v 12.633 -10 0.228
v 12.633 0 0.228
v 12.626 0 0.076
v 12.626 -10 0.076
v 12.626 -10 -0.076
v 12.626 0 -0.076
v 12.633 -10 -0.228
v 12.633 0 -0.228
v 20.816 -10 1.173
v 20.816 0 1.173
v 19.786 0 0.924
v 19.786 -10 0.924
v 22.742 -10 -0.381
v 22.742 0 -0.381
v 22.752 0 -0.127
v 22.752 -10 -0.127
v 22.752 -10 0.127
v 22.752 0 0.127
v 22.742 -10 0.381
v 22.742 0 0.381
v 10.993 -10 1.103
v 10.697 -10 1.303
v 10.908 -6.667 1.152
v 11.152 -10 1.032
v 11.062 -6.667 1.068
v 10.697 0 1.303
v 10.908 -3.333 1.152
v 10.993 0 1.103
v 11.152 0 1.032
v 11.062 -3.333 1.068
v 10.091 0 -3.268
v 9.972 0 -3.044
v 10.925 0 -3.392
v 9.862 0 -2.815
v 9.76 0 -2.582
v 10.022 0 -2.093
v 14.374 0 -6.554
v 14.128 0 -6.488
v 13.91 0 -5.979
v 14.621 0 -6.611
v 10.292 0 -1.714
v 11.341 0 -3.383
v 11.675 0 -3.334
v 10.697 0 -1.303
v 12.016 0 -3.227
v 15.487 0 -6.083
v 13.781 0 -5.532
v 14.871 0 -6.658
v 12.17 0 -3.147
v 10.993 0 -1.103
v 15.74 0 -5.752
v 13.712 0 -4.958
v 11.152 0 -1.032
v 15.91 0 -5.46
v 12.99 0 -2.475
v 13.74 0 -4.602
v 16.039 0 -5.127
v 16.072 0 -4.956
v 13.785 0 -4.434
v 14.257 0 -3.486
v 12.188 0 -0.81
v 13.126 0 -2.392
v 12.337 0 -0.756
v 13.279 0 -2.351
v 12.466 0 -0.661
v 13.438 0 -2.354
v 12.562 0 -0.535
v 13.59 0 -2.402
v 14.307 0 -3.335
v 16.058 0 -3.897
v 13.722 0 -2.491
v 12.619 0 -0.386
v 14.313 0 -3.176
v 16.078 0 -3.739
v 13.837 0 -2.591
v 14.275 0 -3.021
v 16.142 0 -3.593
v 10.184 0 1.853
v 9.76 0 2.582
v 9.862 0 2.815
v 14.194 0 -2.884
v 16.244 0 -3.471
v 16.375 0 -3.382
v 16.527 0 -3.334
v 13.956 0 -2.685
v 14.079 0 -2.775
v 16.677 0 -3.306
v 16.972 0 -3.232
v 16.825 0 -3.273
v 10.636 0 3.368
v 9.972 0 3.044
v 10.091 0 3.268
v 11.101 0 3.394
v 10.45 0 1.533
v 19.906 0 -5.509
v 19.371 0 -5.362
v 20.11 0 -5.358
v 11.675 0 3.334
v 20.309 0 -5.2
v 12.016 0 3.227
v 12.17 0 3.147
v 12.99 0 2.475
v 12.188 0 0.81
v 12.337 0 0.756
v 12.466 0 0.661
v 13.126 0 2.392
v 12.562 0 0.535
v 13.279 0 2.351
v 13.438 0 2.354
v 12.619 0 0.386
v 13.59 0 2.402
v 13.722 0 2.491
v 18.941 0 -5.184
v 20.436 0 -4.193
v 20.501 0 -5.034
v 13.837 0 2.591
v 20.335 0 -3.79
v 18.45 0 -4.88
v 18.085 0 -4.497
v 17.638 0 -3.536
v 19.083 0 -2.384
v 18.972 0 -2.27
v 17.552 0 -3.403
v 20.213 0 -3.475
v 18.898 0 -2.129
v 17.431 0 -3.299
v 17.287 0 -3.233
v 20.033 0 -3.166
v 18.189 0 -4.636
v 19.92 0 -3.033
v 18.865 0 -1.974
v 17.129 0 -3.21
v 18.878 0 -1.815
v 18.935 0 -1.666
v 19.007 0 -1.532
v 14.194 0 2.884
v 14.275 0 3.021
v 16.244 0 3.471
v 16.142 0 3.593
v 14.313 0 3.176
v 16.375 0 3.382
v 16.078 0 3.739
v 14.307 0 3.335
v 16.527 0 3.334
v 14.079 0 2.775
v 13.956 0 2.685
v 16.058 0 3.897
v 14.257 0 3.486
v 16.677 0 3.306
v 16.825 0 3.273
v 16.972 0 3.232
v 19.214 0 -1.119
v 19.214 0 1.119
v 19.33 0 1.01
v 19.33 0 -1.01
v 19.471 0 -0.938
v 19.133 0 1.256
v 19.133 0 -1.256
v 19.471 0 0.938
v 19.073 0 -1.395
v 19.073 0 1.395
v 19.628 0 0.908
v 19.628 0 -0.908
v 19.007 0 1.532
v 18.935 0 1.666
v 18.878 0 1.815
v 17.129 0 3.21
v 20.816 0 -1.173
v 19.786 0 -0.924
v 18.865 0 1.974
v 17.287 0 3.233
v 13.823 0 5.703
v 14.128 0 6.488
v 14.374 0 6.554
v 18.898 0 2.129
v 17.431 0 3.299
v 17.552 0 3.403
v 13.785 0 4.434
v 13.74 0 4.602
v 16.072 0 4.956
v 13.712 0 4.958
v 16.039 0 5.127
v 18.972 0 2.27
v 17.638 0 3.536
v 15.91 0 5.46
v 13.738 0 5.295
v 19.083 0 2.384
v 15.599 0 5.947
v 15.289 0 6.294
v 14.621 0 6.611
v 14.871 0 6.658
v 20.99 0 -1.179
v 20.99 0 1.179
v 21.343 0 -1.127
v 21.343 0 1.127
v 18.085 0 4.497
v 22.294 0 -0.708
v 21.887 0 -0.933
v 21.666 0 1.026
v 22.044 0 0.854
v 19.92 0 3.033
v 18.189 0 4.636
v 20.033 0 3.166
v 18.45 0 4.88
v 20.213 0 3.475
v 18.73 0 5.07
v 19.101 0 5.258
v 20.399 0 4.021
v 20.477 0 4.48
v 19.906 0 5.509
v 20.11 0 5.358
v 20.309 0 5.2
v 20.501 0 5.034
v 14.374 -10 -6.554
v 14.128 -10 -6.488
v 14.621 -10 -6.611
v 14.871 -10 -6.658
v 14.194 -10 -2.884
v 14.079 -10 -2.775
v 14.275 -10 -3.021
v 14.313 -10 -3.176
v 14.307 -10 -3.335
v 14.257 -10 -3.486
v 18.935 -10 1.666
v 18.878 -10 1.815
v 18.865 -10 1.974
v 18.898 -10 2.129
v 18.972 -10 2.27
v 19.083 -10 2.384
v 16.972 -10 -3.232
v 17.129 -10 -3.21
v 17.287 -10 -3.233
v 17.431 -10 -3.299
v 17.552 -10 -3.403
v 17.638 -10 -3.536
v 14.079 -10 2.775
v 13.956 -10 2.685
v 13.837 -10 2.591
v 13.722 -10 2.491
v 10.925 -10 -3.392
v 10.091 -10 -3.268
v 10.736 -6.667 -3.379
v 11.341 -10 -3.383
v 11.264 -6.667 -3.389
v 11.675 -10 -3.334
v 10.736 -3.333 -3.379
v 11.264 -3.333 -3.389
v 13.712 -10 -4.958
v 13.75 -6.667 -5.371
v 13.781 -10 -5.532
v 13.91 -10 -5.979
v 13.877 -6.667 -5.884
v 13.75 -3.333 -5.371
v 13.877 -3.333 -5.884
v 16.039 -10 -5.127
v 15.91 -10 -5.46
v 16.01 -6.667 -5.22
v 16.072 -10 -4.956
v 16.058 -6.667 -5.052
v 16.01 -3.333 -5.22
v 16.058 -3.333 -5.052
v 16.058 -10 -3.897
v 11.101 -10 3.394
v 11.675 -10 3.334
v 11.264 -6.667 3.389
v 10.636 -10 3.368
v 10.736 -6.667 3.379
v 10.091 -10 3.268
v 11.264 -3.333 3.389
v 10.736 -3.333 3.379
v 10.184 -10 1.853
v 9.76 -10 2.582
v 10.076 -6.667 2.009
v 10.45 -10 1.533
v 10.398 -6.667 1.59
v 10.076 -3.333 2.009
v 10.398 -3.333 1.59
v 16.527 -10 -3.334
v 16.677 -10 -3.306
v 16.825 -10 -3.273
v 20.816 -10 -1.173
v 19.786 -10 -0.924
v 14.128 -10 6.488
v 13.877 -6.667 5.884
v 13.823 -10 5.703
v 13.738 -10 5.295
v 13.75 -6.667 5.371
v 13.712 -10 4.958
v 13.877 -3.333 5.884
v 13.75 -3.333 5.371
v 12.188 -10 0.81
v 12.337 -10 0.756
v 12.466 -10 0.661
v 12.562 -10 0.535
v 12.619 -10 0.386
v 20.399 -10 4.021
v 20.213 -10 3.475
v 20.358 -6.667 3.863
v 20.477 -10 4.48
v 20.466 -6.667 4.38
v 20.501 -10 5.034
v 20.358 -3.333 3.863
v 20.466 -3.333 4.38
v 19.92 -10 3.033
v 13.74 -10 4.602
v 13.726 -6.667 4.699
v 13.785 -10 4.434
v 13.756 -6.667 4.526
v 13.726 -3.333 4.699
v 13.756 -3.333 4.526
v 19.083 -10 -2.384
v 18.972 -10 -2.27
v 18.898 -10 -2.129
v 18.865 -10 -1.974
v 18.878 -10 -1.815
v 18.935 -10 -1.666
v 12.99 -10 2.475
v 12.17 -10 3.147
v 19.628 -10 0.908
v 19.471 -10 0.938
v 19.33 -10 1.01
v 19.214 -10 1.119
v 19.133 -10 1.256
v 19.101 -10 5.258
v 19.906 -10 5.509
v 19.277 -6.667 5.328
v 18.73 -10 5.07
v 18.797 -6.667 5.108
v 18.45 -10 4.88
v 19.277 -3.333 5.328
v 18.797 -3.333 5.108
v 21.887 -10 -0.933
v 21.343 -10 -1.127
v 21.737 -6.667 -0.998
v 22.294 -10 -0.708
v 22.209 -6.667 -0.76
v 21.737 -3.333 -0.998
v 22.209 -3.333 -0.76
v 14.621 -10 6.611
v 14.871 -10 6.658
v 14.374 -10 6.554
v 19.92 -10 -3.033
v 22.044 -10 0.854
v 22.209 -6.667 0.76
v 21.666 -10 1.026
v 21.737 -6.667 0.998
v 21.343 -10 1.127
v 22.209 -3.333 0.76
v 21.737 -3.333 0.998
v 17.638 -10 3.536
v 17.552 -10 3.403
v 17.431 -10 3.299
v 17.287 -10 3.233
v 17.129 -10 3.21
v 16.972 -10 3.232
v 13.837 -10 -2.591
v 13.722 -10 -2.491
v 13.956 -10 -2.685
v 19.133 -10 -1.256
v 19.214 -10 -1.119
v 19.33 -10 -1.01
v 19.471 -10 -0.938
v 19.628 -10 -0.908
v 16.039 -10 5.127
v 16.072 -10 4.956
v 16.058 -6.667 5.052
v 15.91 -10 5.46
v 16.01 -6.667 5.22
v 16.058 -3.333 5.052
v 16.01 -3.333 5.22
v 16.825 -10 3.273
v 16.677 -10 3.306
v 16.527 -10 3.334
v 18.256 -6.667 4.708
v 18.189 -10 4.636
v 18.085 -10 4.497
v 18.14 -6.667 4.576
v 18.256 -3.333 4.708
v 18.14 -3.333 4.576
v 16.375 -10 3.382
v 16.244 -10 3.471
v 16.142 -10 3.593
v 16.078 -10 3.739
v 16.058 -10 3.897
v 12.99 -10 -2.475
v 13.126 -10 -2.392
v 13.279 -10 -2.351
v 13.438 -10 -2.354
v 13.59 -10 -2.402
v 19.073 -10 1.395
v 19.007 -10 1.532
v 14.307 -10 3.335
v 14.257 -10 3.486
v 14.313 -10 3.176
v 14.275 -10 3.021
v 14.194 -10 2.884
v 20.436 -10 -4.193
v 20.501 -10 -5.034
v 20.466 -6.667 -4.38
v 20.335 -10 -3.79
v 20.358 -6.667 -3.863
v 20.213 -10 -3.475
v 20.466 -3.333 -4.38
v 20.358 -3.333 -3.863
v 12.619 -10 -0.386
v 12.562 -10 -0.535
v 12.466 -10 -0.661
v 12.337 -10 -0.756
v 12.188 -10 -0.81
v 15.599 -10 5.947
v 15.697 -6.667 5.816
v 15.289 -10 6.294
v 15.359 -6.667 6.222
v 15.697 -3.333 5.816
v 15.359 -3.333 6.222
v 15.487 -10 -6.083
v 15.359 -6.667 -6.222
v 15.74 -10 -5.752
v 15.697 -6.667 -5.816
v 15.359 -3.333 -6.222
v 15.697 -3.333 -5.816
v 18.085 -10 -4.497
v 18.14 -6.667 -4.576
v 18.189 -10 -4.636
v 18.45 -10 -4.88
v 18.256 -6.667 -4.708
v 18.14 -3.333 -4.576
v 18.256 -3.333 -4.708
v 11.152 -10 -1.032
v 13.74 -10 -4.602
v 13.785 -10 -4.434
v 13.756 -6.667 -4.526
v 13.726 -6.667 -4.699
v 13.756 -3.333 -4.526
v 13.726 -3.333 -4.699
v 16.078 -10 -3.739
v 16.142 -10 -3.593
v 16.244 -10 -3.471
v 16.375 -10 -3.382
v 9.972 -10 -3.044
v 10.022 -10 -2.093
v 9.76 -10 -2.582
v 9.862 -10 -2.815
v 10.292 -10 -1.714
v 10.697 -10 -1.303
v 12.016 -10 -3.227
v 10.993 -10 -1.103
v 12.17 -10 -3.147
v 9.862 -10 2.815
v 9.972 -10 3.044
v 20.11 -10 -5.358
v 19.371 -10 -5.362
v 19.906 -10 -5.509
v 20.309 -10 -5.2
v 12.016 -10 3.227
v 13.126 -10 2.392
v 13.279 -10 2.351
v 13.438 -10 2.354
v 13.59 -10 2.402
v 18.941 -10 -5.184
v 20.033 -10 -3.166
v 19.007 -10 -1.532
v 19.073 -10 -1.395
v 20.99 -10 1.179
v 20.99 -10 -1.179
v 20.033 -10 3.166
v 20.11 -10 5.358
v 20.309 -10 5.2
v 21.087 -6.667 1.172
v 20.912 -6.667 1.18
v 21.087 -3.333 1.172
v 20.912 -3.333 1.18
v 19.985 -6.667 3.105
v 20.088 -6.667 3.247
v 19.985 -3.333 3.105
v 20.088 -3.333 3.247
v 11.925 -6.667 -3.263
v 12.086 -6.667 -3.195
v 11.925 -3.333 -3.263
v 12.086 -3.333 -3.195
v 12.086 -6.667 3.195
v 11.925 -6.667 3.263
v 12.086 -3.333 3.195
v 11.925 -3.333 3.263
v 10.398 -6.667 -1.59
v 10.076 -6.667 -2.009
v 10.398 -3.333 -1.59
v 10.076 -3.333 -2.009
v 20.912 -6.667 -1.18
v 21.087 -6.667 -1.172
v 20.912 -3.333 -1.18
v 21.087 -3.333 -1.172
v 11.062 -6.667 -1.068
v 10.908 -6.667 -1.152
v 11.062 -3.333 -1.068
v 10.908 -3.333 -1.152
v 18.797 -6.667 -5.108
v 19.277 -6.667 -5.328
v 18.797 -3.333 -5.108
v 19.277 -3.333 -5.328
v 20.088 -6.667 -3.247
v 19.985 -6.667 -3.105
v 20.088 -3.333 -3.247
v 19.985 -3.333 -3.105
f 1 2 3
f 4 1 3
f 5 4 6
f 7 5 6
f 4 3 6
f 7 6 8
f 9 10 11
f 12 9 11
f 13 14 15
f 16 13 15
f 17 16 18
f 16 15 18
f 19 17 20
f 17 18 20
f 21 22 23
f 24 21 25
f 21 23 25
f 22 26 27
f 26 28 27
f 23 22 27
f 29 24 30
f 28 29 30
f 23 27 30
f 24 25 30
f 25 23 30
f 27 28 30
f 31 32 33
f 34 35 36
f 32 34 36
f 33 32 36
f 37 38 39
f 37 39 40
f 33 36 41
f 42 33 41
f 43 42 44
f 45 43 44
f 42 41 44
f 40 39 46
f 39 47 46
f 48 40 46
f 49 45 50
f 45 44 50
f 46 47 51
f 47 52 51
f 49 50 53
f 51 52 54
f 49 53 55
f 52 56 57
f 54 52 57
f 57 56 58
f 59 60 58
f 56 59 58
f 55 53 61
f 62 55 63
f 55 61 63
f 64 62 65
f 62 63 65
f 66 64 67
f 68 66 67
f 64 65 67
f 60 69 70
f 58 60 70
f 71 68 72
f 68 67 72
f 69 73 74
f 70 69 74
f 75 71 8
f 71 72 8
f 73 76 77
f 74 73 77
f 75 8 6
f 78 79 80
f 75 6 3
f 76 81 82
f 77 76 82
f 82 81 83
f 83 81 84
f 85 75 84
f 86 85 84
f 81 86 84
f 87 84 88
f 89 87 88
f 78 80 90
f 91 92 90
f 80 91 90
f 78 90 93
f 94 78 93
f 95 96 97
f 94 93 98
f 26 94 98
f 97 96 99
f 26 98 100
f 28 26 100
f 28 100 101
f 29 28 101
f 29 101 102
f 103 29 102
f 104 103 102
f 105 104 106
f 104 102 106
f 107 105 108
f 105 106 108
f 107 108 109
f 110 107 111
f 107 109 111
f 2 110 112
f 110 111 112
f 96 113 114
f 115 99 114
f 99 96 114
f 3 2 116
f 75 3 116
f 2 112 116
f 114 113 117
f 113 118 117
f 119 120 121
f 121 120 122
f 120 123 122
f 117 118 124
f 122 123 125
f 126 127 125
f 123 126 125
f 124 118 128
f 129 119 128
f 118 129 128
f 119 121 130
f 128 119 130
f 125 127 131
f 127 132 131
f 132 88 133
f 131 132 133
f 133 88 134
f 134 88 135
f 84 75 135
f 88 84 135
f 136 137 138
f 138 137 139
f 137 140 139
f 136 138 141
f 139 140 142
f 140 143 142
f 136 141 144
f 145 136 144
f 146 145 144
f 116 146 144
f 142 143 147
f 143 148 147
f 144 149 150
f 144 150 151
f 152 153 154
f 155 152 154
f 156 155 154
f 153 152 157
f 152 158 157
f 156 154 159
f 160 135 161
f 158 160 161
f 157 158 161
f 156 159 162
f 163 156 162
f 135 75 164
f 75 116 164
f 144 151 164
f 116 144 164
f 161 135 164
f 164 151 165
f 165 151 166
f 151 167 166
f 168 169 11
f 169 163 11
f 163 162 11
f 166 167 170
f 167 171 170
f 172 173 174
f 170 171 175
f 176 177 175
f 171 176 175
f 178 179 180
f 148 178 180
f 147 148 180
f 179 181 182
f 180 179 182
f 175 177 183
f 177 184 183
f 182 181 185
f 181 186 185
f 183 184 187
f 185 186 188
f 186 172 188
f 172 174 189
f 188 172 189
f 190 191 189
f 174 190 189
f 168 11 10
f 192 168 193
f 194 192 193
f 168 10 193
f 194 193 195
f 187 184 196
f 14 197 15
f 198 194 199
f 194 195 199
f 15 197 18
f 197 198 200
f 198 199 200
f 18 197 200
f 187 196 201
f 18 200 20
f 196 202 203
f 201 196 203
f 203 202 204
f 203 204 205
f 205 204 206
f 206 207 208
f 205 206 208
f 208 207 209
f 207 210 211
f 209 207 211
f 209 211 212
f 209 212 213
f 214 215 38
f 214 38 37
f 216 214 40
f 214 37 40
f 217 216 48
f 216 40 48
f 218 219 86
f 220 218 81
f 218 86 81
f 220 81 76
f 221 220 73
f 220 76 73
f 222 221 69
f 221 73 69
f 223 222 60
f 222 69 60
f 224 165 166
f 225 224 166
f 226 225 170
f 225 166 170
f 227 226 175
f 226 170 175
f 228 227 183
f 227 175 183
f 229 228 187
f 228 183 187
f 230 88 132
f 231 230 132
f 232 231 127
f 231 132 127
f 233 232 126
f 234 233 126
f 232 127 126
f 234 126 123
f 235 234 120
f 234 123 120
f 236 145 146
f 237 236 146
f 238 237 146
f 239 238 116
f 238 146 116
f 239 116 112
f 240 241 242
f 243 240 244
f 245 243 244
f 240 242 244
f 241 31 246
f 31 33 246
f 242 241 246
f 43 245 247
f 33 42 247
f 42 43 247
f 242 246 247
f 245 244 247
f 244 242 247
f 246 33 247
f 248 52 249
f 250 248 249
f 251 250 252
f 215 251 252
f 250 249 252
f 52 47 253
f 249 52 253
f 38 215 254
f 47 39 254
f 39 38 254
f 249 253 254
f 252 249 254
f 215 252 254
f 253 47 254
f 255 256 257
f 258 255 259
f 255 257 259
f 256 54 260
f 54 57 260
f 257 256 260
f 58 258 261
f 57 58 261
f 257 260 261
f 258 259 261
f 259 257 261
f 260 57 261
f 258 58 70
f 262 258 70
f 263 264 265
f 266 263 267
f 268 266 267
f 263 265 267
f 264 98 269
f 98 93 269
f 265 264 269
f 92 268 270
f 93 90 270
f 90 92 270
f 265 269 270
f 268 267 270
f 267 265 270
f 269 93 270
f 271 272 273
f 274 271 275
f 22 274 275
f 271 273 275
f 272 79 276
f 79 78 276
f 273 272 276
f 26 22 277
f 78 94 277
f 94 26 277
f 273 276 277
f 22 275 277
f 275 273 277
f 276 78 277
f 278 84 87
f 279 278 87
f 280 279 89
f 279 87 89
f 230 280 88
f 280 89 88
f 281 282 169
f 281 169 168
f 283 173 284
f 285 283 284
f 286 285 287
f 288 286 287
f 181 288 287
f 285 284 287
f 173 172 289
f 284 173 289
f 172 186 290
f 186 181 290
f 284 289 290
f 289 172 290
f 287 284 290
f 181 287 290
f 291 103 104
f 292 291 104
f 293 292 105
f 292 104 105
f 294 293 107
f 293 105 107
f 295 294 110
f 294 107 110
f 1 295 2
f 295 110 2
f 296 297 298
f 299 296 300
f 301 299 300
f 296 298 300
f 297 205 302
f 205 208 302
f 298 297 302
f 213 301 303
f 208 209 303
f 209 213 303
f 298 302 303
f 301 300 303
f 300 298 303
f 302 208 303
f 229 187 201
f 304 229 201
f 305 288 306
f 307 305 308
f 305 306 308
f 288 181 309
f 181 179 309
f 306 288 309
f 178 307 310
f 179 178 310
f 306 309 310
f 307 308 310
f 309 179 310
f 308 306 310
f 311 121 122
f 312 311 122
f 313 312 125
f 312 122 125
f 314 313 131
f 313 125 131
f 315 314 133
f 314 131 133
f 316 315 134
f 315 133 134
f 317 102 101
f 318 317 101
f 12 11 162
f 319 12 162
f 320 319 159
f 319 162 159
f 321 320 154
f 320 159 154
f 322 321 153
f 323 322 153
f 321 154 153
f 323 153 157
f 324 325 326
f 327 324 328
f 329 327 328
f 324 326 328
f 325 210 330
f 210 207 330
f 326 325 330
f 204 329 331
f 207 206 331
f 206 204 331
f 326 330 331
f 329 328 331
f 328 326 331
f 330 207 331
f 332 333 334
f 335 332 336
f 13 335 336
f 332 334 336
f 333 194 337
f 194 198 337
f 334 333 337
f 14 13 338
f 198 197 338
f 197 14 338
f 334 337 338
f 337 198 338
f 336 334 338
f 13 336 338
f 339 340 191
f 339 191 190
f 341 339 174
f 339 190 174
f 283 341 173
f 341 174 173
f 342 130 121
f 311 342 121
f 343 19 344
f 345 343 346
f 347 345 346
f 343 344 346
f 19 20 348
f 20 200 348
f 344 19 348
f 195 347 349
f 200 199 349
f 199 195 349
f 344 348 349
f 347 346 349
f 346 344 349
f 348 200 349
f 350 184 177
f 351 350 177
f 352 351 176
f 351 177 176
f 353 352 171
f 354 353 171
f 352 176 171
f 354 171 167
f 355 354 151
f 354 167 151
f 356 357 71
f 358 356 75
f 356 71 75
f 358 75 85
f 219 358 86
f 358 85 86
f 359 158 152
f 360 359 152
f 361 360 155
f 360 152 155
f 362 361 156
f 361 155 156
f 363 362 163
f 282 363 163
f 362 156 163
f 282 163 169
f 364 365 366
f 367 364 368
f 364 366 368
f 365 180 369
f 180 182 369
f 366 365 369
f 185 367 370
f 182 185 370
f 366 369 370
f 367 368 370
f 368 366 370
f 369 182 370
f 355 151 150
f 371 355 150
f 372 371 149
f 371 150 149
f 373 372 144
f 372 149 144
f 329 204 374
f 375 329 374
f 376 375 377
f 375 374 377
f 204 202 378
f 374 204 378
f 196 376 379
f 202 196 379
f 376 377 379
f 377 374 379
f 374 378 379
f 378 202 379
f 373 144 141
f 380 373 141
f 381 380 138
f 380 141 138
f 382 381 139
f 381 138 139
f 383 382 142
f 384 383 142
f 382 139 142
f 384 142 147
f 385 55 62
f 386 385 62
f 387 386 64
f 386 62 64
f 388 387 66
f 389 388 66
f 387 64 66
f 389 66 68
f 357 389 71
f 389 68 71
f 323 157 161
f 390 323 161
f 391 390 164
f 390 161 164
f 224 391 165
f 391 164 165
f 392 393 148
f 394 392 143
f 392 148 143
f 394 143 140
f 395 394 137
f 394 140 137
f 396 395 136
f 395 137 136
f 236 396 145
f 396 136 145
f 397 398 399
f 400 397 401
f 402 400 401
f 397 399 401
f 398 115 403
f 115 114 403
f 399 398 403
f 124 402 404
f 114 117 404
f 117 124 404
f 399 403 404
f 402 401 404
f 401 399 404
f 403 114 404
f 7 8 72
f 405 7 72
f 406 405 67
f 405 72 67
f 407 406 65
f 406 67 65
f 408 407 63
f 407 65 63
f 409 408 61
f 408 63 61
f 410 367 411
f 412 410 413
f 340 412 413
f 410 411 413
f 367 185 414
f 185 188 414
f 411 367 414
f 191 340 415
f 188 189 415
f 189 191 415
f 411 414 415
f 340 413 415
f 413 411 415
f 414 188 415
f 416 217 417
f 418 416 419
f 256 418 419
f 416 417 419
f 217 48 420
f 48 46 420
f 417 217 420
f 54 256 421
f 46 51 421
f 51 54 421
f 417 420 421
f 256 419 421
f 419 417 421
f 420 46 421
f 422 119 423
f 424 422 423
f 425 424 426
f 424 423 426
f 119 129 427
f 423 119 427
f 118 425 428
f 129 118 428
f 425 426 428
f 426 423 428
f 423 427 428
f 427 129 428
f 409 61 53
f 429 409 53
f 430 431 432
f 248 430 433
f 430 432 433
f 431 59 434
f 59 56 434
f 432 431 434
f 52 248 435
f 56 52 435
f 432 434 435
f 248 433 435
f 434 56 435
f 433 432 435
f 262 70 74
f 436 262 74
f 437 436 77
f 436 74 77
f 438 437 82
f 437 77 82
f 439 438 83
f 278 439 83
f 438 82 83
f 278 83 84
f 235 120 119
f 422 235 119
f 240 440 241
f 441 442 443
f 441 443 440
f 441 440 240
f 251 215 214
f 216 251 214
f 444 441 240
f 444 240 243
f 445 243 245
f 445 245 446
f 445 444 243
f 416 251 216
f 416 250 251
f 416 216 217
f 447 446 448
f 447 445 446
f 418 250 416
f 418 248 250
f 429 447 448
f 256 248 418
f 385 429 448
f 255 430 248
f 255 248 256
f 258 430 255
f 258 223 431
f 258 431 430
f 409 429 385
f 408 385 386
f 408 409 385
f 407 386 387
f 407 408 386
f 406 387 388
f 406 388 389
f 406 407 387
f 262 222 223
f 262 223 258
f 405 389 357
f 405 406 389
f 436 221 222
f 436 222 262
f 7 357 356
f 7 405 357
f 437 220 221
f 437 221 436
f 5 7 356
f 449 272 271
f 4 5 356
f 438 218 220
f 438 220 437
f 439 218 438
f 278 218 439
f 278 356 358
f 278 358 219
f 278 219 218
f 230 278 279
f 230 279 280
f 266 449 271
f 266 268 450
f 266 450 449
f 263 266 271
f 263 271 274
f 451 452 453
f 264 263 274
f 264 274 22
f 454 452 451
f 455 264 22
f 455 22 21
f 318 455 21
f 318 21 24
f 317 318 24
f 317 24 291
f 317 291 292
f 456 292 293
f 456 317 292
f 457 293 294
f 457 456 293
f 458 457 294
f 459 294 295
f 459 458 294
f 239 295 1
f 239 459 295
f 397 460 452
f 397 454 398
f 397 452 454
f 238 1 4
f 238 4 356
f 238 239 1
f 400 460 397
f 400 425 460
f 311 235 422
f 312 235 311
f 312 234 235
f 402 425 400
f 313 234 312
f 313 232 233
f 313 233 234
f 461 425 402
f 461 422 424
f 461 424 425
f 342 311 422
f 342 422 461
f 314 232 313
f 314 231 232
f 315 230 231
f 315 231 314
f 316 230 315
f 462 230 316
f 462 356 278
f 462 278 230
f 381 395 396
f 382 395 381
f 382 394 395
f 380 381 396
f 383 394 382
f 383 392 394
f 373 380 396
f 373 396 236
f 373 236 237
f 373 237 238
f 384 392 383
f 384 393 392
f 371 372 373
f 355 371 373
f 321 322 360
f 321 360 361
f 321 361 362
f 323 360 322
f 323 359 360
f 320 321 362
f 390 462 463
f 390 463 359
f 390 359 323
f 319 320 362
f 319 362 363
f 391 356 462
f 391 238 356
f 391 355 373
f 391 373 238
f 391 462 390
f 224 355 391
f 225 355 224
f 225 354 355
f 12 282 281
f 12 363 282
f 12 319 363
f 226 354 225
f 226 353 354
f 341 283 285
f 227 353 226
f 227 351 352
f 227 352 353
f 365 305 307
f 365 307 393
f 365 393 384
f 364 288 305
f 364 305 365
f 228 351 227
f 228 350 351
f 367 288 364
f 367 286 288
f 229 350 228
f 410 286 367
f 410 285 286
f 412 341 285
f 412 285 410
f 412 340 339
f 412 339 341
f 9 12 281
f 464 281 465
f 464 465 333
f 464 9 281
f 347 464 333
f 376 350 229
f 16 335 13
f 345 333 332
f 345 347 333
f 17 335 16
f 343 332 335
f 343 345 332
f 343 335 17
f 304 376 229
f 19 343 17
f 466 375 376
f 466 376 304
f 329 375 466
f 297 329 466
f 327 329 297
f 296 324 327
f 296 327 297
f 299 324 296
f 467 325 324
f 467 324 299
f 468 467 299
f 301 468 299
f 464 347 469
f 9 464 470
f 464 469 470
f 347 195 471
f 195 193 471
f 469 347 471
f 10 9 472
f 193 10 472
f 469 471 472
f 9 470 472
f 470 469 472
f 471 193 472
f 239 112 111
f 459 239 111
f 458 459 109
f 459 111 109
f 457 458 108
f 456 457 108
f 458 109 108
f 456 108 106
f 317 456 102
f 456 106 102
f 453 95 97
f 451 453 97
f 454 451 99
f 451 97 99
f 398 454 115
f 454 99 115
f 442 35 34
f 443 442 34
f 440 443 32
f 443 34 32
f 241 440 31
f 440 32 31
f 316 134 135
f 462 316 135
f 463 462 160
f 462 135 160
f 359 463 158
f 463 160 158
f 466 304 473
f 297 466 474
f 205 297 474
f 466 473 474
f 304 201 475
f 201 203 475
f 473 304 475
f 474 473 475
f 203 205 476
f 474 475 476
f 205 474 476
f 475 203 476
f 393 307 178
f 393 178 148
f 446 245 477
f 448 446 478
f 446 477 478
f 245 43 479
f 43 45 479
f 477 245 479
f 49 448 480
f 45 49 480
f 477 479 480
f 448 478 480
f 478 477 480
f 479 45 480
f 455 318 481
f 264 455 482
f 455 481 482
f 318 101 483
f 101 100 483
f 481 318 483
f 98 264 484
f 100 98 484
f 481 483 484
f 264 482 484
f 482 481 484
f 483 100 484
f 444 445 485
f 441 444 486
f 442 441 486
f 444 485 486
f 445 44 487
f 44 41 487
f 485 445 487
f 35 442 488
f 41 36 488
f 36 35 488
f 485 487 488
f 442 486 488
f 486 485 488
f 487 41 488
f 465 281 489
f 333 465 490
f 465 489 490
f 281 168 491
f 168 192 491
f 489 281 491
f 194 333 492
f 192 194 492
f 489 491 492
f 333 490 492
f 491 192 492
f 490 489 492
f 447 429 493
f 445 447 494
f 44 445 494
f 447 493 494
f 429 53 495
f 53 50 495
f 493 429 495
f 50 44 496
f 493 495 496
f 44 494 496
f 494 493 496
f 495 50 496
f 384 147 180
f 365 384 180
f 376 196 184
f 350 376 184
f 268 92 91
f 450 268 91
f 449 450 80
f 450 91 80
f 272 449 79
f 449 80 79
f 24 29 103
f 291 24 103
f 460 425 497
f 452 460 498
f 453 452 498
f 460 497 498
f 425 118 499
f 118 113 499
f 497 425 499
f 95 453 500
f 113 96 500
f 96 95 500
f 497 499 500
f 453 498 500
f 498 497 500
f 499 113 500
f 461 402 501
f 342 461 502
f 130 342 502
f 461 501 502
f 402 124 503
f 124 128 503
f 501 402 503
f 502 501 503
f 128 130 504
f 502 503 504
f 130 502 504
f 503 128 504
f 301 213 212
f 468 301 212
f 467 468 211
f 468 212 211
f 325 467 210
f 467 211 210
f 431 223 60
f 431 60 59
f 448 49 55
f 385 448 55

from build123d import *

# Parameters (mm, degrees)
PAD003_DEPTH = 10
POCKET_DEPTH = 10.001


with BuildPart() as ruota_dentata_motore:
    # InvoluteGear001 → Pad003 (new body)
    with BuildSketch(Plane(origin=(16, 0, 0), x_dir=(1, 0, 0), z_dir=(0, -1, 0))):
        with BuildLine():
            Line((3.786059, -0.923719), (4.81556, -1.173313))
            add(Edge.make_bspline(
                [(4.81556, -1.173313), (4.873385, -1.181675), (5.046346, -1.195856), (5.34323, -1.127243)],
                knots=[0, 0, 0, 0, 1, 1, 1, 1], degree=3))
            add(Edge.make_bspline(
                [(5.34323, -1.127243), (5.693315, -1.042189), (6.183331, -0.841463), (6.742255, -0.380782)],
                knots=[0, 0, 0, 0, 1, 1, 1, 1], degree=3))
            ThreePointArc((6.742255, -0.380782), (6.753004, 0), (6.742255, 0.380782))
            add(Edge.make_bspline(
                [(6.742255, 0.380782), (6.183331, 0.841463), (5.693315, 1.042189), (5.34323, 1.127243)],
                knots=[0, 0, 0, 0, 1, 1, 1, 1], degree=3))
            add(Edge.make_bspline(
                [(5.34323, 1.127243), (5.046346, 1.195856), (4.873385, 1.181675), (4.81556, 1.173313)],
                knots=[0, 0, 0, 0, 1, 1, 1, 1], degree=3))
            Line((4.81556, 1.173313), (3.786059, 0.923719))
            ThreePointArc((3.786059, 0.923719), (3.397937, 0.968687), (3.132738, 1.25562))
            ThreePointArc((3.132738, 1.25562), (3.04077, 1.464358), (2.934913, 1.666407))
            ThreePointArc((2.934913, 1.666407), (2.875929, 2.052647), (3.082762, 2.384131))
            Line((3.082762, 2.384131), (3.919786, 3.033407))
            add(Edge.make_bspline(
                [(3.919786, 3.033407), (3.962376, 3.073404), (4.081304, 3.199788), (4.212764, 3.474681)],
                knots=[0, 0, 0, 0, 1, 1, 1, 1], degree=3))
            add(Edge.make_bspline(
                [(4.212764, 3.474681), (4.364539, 3.801419), (4.513126, 4.309679), (4.501435, 5.033894)],
                knots=[0, 0, 0, 0, 1, 1, 1, 1], degree=3))
            ThreePointArc((4.501435, 5.033894), (4.210429, 5.279711), (3.90602, 5.508721))
            add(Edge.make_bspline(
                [(3.90602, 5.508721), (3.197362, 5.358966), (2.734908, 5.101007), (2.450135, 4.88033)],
                knots=[0, 0, 0, 0, 1, 1, 1, 1], degree=3))
            add(Edge.make_bspline(
                [(2.450135, 4.88033), (2.211387, 4.690996), (2.114635, 4.546928), (2.085119, 4.496505)],
                knots=[0, 0, 0, 0, 1, 1, 1, 1], degree=3))
            Line((2.085119, 4.496505), (1.638377, 3.53599))
            ThreePointArc((1.638377, 3.53599), (1.361229, 3.260581), (0.971547, 3.232139))
            ThreePointArc((0.971547, 3.232139), (0.751008, 3.290382), (0.527039, 3.333595))
            ThreePointArc((0.527039, 3.333595), (0.188288, 3.528297), (0.058082, 3.896681))
            Line((0.058082, 3.896681), (0.072333, 4.95591))
            add(Edge.make_bspline(
                [(0.072333, 4.95591), (0.067617, 5.014146), (0.042956, 5.185927), (-0.09, 5.460099)],
                knots=[0, 0, 0, 0, 1, 1, 1, 1], degree=3))
            add(Edge.make_bspline(
                [(-0.09, 5.460099), (-0.250823, 5.78248), (-0.555555, 6.215545), (-1.129058, 6.657945)],
                knots=[0, 0, 0, 0, 1, 1, 1, 1], degree=3))
            ThreePointArc((-1.129058, 6.657945), (-1.502685, 6.583692), (-1.871528, 6.488481))
            add(Edge.make_bspline(
                [(-1.871528, 6.488481), (-2.196286, 5.841059), (-2.28294, 5.318663), (-2.287961, 4.958429)],
                knots=[0, 0, 0, 0, 1, 1, 1, 1], degree=3))
            add(Edge.make_bspline(
                [(-2.287961, 4.958429), (-2.288791, 4.65372), (-2.236478, 4.488252), (-2.215459, 4.433737)],
                knots=[0, 0, 0, 0, 1, 1, 1, 1], degree=3))
            Line((-2.215459, 4.433737), (-1.743037, 3.485588))
            ThreePointArc((-1.743037, 3.485588), (-1.700512, 3.09719), (-1.921238, 2.774792))
            ThreePointArc((-1.921238, 2.774792), (-2.104278, 2.638681), (-2.277706, 2.490518))
            ThreePointArc((-2.277706, 2.490518), (-2.641138, 2.347067), (-3.010335, 2.474951))
            Line((-3.010335, 2.474951), (-3.829588, 3.146512))
            add(Edge.make_bspline(
                [(-3.829588, 3.146512), (-3.878059, 3.179135), (-4.027738, 3.266957), (-4.324991, 3.333952)],
                knots=[0, 0, 0, 0, 1, 1, 1, 1], degree=3))
            add(Edge.make_bspline(
                [(-4.324991, 3.333952), (-4.677311, 3.409216), (-5.205892, 3.440979), (-5.909347, 3.268428)],
                knots=[0, 0, 0, 0, 1, 1, 1, 1], degree=3))
            ThreePointArc((-5.909347, 3.268428), (-6.084247, 2.930019), (-6.239777, 2.582282))
            add(Edge.make_bspline(
                [(-6.239777, 2.582282), (-5.936086, 1.924715), (-5.581688, 1.531257), (-5.303176, 1.30273)],
                knots=[0, 0, 0, 0, 1, 1, 1, 1], degree=3))
            add(Edge.make_bspline(
                [(-5.303176, 1.30273), (-5.065463, 1.112098), (-4.903478, 1.04983), (-4.847751, 1.032274)],
                knots=[0, 0, 0, 0, 1, 1, 1, 1], degree=3))
            Line((-4.847751, 1.032274), (-3.811908, 0.810467))
            ThreePointArc((-3.811908, 0.810467), (-3.481733, 0.601552), (-3.367292, 0.22797))
            ThreePointArc((-3.367292, 0.22797), (-3.375, 0), (-3.367292, -0.22797))
            ThreePointArc((-3.367292, -0.22797), (-3.481733, -0.601552), (-3.811908, -0.810467))
            Line((-3.811908, -0.810467), (-4.847751, -1.032274))
            add(Edge.make_bspline(
                [(-4.847751, -1.032274), (-4.903478, -1.04983), (-5.065463, -1.112098), (-5.303176, -1.30273)],
                knots=[0, 0, 0, 0, 1, 1, 1, 1], degree=3))
            add(Edge.make_bspline(
                [(-5.303176, -1.30273), (-5.581688, -1.531257), (-5.936086, -1.924715), (-6.239777, -2.582282)],
                knots=[0, 0, 0, 0, 1, 1, 1, 1], degree=3))
            ThreePointArc((-6.239777, -2.582282), (-6.084247, -2.930019), (-5.909347, -3.268428))
            add(Edge.make_bspline(
                [(-5.909347, -3.268428), (-5.205892, -3.440979), (-4.677311, -3.409216), (-4.324991, -3.333952)],
                knots=[0, 0, 0, 0, 1, 1, 1, 1], degree=3))
            add(Edge.make_bspline(
                [(-4.324991, -3.333952), (-4.027738, -3.266957), (-3.878059, -3.179135), (-3.829588, -3.146512)],
                knots=[0, 0, 0, 0, 1, 1, 1, 1], degree=3))
            Line((-3.829588, -3.146512), (-3.010335, -2.474951))
            ThreePointArc((-3.010335, -2.474951), (-2.641138, -2.347067), (-2.277706, -2.490518))
            ThreePointArc((-2.277706, -2.490518), (-2.104278, -2.638681), (-1.921238, -2.774792))
            ThreePointArc((-1.921238, -2.774792), (-1.700512, -3.09719), (-1.743037, -3.485588))
            Line((-1.743037, -3.485588), (-2.215459, -4.433737))
            add(Edge.make_bspline(
                [(-2.215459, -4.433737), (-2.236478, -4.488252), (-2.288791, -4.65372), (-2.287961, -4.958429)],
                knots=[0, 0, 0, 0, 1, 1, 1, 1], degree=3))
            add(Edge.make_bspline(
                [(-2.287961, -4.958429), (-2.28294, -5.318663), (-2.196286, -5.841059), (-1.871528, -6.488481)],
                knots=[0, 0, 0, 0, 1, 1, 1, 1], degree=3))
            ThreePointArc((-1.871528, -6.488481), (-1.502685, -6.583692), (-1.129058, -6.657945))
            add(Edge.make_bspline(
                [(-1.129058, -6.657945), (-0.555555, -6.215545), (-0.250823, -5.78248), (-0.09, -5.460099)],
                knots=[0, 0, 0, 0, 1, 1, 1, 1], degree=3))
            add(Edge.make_bspline(
                [(-0.09, -5.460099), (0.042956, -5.185927), (0.067617, -5.014146), (0.072333, -4.95591)],
                knots=[0, 0, 0, 0, 1, 1, 1, 1], degree=3))
            Line((0.072333, -4.95591), (0.058082, -3.896681))
            ThreePointArc((0.058082, -3.896681), (0.188288, -3.528297), (0.527039, -3.333595))
            ThreePointArc((0.527039, -3.333595), (0.751008, -3.290382), (0.971547, -3.232139))
            ThreePointArc((0.971547, -3.232139), (1.361229, -3.260581), (1.638377, -3.53599))
            Line((1.638377, -3.53599), (2.085119, -4.496505))
            add(Edge.make_bspline(
                [(2.085119, -4.496505), (2.114635, -4.546928), (2.211387, -4.690996), (2.450135, -4.88033)],
                knots=[0, 0, 0, 0, 1, 1, 1, 1], degree=3))
            add(Edge.make_bspline(
                [(2.450135, -4.88033), (2.734908, -5.101007), (3.197362, -5.358966), (3.90602, -5.508721)],
                knots=[0, 0, 0, 0, 1, 1, 1, 1], degree=3))
            ThreePointArc((3.90602, -5.508721), (4.210429, -5.279711), (4.501435, -5.033894))
            add(Edge.make_bspline(
                [(4.501435, -5.033894), (4.513126, -4.309679), (4.364539, -3.801419), (4.212764, -3.474681)],
                knots=[0, 0, 0, 0, 1, 1, 1, 1], degree=3))
            add(Edge.make_bspline(
                [(4.212764, -3.474681), (4.081304, -3.199788), (3.962376, -3.073404), (3.919786, -3.033407)],
                knots=[0, 0, 0, 0, 1, 1, 1, 1], degree=3))
            Line((3.919786, -3.033407), (3.082762, -2.384131))
            ThreePointArc((3.082762, -2.384131), (2.875929, -2.052647), (2.934913, -1.666407))
            ThreePointArc((2.934913, -1.666407), (3.04077, -1.464358), (3.132738, -1.25562))
            ThreePointArc((3.132738, -1.25562), (3.397937, -0.968687), (3.786059, -0.923719))
        make_face()
    extrude(amount=PAD003_DEPTH)


with BuildPart() as ruota_dentata_motore_con_buco:
    # Pocket base: copy of ruota_dentata_motore
    add(ruota_dentata_motore.part)

    # Sketch012 → Pocket (cut, through all)
    with BuildSketch(Plane(origin=(16, -10, 0), x_dir=(1, 0, 0), z_dir=(0, -1, 0))):
        with BuildLine():
            ThreePointArc((1.075668, -1.045437), (0.009602, 1.50979), (-1.056464, -1.045437))
            Line((-1.056464, -1.045437), (1.075668, -1.045437))
        make_face()
    extrude(amount=-POCKET_DEPTH, mode=Mode.SUBTRACT)

    # Fusion004: union ruota_dentata_motore
    add(ruota_dentata_motore.part)


solid = ruota_dentata_motore_con_buco.part
